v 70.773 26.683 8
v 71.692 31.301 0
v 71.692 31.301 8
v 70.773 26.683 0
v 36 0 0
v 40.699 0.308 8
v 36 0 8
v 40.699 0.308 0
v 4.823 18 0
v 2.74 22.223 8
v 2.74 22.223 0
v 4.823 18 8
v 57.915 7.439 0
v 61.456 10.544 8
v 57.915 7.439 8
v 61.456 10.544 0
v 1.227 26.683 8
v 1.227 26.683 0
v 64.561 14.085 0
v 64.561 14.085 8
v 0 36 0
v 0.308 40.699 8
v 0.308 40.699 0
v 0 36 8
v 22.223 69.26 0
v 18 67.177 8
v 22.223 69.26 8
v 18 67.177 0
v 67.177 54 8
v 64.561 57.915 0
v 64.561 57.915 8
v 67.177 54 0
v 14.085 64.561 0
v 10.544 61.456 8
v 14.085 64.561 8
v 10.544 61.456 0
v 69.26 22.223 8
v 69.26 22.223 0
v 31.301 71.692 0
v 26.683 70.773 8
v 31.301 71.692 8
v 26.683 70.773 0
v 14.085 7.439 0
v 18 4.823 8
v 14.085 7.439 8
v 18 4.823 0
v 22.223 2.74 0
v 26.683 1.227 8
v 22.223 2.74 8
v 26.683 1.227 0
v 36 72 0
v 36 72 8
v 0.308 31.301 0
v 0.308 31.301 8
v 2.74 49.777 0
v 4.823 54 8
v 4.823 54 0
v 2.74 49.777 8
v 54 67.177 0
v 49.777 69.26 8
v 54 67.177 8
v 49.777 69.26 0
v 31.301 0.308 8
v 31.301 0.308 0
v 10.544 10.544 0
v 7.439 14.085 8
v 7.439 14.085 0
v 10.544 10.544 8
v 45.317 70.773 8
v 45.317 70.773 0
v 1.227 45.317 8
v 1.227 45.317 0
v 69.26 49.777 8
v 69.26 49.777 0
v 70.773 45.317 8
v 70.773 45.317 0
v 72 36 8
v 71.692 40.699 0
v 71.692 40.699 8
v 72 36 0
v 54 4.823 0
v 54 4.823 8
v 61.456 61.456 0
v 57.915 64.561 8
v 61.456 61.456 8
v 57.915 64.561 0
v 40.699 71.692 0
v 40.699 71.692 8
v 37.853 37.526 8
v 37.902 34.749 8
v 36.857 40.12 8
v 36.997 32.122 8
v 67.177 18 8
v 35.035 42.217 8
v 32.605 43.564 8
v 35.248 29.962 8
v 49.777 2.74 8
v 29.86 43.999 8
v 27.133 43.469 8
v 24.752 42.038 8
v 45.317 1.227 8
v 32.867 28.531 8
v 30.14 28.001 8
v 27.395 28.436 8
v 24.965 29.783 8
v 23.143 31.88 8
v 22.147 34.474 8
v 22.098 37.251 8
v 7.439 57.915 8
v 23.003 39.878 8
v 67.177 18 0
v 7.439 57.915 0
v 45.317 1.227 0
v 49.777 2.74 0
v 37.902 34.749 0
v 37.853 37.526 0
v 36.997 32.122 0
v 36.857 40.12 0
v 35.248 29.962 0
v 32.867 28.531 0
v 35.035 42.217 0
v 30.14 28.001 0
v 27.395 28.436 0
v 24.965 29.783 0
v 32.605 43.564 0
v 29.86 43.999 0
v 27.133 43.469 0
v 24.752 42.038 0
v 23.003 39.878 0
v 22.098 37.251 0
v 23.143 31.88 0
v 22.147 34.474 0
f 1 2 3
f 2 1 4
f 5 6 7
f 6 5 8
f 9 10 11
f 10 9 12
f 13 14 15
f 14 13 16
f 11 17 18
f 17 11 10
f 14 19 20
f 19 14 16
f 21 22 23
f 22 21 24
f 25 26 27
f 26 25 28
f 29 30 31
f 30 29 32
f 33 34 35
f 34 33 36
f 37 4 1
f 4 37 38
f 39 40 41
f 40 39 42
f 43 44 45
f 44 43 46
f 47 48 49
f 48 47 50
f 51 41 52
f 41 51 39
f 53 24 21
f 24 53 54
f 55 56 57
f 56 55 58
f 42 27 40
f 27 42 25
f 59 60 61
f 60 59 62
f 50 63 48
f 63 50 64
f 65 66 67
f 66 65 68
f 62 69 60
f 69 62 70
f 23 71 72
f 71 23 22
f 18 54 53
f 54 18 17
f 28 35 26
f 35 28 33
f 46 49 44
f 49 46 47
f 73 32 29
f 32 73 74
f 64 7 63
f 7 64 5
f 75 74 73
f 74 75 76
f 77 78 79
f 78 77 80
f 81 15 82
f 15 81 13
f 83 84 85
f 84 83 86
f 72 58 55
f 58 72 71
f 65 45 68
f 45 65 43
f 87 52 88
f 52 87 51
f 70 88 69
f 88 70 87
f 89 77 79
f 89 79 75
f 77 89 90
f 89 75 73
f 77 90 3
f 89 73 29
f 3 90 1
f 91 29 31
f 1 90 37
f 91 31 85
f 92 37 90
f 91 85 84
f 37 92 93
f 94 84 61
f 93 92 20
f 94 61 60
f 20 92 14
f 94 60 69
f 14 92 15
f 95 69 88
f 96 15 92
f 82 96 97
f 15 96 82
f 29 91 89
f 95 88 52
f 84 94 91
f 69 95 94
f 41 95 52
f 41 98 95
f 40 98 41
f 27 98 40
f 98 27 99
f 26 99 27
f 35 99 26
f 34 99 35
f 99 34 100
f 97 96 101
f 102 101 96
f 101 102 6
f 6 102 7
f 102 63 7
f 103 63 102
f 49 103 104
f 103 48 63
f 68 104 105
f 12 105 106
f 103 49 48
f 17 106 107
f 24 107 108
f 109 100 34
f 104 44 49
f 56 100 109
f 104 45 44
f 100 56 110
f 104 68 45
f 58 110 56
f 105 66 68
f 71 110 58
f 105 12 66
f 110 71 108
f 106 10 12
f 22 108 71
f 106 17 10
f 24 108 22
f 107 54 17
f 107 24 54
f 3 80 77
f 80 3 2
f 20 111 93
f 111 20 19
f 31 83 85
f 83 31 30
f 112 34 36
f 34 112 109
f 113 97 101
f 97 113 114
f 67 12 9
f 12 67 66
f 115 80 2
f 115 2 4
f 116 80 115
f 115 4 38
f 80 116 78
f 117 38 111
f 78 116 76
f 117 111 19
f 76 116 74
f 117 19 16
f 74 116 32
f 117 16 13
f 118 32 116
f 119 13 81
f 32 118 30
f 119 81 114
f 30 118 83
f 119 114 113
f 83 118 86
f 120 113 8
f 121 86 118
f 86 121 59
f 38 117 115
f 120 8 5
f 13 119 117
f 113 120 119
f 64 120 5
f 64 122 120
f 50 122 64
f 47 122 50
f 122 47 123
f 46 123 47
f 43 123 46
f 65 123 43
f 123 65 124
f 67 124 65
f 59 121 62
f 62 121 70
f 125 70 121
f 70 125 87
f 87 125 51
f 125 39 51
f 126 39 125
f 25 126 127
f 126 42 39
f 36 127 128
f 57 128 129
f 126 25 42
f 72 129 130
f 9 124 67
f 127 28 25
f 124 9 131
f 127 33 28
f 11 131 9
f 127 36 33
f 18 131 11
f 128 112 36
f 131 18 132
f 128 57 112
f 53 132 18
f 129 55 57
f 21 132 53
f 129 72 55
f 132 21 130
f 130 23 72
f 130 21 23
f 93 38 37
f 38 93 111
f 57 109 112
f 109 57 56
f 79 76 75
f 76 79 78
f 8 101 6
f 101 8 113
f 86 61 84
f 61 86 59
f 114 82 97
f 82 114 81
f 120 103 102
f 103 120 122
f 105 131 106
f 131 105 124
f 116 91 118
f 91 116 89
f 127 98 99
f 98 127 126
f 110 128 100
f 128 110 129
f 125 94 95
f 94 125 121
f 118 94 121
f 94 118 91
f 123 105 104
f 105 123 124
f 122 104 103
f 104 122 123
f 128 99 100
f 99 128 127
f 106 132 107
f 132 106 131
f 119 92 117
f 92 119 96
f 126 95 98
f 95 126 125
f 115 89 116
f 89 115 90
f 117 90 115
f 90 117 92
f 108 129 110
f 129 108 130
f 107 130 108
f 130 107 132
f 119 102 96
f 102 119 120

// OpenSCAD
$fn = 32;

// ----------------------------------------------------------------------
// Cam plate: eccentric cam, base R36
// ----------------------------------------------------------------------

// --- parameters (mm) ---
base_r = 36;              // base circle radius
lobe_h = 10;              // cam lobe rise
bore_r = 8;               // shaft bore radius
plate_t = 8;              // plate thickness, Z (extrusion height)
ecc = 6;                  // disc eccentricity
fit_tol = 0.05;           // declared fit tolerance (prompt contract)
free_tol = 0.3;           // declared free tolerance (prompt contract)

profile = [[72, 36], [71.692, 40.699], [70.773, 45.317], [69.26, 49.777], [67.177, 54], [64.561, 57.915], [61.456, 61.456], [57.915, 64.561], [54, 67.177], [49.777, 69.26], [45.317, 70.773], [40.699, 71.692], [36, 72], [31.301, 71.692], [26.683, 70.773], [22.223, 69.26], [18, 67.177], [14.085, 64.561], [10.544, 61.456], [7.439, 57.915], [4.823, 54], [2.74, 49.777], [1.227, 45.317], [0.308, 40.699], [0, 36], [0.308, 31.301], [1.227, 26.683], [2.74, 22.223], [4.823, 18], [7.439, 14.085], [10.544, 10.544], [14.085, 7.439], [18, 4.823], [22.223, 2.74], [26.683, 1.227], [31.301, 0.308], [36, 0], [40.699, 0.308], [45.317, 1.227], [49.777, 2.74], [54, 4.823], [57.915, 7.439], [61.456, 10.544], [64.561, 14.085], [67.177, 18], [69.26, 22.223], [70.773, 26.683], [71.692, 31.301]];  // primary outline, 48 points, counter clockwise
void_1 = [[37.853, 37.526], [36.857, 40.12], [35.035, 42.217], [32.605, 43.564], [29.86, 43.999], [27.133, 43.469], [24.752, 42.038], [23.003, 39.878], [22.098, 37.251], [22.147, 34.474], [23.143, 31.88], [24.965, 29.783], [27.395, 28.436], [30.14, 28.001], [32.867, 28.531], [35.248, 29.962], [36.997, 32.122], [37.902, 34.749]];  // shaft bore, 18 points

// --- the one profile operation ---
difference() {
  linear_extrude(height = plate_t) polygon(points = profile);
  translate([0, 0, -1])
    linear_extrude(height = plate_t + 2) polygon(points = void_1);
}
